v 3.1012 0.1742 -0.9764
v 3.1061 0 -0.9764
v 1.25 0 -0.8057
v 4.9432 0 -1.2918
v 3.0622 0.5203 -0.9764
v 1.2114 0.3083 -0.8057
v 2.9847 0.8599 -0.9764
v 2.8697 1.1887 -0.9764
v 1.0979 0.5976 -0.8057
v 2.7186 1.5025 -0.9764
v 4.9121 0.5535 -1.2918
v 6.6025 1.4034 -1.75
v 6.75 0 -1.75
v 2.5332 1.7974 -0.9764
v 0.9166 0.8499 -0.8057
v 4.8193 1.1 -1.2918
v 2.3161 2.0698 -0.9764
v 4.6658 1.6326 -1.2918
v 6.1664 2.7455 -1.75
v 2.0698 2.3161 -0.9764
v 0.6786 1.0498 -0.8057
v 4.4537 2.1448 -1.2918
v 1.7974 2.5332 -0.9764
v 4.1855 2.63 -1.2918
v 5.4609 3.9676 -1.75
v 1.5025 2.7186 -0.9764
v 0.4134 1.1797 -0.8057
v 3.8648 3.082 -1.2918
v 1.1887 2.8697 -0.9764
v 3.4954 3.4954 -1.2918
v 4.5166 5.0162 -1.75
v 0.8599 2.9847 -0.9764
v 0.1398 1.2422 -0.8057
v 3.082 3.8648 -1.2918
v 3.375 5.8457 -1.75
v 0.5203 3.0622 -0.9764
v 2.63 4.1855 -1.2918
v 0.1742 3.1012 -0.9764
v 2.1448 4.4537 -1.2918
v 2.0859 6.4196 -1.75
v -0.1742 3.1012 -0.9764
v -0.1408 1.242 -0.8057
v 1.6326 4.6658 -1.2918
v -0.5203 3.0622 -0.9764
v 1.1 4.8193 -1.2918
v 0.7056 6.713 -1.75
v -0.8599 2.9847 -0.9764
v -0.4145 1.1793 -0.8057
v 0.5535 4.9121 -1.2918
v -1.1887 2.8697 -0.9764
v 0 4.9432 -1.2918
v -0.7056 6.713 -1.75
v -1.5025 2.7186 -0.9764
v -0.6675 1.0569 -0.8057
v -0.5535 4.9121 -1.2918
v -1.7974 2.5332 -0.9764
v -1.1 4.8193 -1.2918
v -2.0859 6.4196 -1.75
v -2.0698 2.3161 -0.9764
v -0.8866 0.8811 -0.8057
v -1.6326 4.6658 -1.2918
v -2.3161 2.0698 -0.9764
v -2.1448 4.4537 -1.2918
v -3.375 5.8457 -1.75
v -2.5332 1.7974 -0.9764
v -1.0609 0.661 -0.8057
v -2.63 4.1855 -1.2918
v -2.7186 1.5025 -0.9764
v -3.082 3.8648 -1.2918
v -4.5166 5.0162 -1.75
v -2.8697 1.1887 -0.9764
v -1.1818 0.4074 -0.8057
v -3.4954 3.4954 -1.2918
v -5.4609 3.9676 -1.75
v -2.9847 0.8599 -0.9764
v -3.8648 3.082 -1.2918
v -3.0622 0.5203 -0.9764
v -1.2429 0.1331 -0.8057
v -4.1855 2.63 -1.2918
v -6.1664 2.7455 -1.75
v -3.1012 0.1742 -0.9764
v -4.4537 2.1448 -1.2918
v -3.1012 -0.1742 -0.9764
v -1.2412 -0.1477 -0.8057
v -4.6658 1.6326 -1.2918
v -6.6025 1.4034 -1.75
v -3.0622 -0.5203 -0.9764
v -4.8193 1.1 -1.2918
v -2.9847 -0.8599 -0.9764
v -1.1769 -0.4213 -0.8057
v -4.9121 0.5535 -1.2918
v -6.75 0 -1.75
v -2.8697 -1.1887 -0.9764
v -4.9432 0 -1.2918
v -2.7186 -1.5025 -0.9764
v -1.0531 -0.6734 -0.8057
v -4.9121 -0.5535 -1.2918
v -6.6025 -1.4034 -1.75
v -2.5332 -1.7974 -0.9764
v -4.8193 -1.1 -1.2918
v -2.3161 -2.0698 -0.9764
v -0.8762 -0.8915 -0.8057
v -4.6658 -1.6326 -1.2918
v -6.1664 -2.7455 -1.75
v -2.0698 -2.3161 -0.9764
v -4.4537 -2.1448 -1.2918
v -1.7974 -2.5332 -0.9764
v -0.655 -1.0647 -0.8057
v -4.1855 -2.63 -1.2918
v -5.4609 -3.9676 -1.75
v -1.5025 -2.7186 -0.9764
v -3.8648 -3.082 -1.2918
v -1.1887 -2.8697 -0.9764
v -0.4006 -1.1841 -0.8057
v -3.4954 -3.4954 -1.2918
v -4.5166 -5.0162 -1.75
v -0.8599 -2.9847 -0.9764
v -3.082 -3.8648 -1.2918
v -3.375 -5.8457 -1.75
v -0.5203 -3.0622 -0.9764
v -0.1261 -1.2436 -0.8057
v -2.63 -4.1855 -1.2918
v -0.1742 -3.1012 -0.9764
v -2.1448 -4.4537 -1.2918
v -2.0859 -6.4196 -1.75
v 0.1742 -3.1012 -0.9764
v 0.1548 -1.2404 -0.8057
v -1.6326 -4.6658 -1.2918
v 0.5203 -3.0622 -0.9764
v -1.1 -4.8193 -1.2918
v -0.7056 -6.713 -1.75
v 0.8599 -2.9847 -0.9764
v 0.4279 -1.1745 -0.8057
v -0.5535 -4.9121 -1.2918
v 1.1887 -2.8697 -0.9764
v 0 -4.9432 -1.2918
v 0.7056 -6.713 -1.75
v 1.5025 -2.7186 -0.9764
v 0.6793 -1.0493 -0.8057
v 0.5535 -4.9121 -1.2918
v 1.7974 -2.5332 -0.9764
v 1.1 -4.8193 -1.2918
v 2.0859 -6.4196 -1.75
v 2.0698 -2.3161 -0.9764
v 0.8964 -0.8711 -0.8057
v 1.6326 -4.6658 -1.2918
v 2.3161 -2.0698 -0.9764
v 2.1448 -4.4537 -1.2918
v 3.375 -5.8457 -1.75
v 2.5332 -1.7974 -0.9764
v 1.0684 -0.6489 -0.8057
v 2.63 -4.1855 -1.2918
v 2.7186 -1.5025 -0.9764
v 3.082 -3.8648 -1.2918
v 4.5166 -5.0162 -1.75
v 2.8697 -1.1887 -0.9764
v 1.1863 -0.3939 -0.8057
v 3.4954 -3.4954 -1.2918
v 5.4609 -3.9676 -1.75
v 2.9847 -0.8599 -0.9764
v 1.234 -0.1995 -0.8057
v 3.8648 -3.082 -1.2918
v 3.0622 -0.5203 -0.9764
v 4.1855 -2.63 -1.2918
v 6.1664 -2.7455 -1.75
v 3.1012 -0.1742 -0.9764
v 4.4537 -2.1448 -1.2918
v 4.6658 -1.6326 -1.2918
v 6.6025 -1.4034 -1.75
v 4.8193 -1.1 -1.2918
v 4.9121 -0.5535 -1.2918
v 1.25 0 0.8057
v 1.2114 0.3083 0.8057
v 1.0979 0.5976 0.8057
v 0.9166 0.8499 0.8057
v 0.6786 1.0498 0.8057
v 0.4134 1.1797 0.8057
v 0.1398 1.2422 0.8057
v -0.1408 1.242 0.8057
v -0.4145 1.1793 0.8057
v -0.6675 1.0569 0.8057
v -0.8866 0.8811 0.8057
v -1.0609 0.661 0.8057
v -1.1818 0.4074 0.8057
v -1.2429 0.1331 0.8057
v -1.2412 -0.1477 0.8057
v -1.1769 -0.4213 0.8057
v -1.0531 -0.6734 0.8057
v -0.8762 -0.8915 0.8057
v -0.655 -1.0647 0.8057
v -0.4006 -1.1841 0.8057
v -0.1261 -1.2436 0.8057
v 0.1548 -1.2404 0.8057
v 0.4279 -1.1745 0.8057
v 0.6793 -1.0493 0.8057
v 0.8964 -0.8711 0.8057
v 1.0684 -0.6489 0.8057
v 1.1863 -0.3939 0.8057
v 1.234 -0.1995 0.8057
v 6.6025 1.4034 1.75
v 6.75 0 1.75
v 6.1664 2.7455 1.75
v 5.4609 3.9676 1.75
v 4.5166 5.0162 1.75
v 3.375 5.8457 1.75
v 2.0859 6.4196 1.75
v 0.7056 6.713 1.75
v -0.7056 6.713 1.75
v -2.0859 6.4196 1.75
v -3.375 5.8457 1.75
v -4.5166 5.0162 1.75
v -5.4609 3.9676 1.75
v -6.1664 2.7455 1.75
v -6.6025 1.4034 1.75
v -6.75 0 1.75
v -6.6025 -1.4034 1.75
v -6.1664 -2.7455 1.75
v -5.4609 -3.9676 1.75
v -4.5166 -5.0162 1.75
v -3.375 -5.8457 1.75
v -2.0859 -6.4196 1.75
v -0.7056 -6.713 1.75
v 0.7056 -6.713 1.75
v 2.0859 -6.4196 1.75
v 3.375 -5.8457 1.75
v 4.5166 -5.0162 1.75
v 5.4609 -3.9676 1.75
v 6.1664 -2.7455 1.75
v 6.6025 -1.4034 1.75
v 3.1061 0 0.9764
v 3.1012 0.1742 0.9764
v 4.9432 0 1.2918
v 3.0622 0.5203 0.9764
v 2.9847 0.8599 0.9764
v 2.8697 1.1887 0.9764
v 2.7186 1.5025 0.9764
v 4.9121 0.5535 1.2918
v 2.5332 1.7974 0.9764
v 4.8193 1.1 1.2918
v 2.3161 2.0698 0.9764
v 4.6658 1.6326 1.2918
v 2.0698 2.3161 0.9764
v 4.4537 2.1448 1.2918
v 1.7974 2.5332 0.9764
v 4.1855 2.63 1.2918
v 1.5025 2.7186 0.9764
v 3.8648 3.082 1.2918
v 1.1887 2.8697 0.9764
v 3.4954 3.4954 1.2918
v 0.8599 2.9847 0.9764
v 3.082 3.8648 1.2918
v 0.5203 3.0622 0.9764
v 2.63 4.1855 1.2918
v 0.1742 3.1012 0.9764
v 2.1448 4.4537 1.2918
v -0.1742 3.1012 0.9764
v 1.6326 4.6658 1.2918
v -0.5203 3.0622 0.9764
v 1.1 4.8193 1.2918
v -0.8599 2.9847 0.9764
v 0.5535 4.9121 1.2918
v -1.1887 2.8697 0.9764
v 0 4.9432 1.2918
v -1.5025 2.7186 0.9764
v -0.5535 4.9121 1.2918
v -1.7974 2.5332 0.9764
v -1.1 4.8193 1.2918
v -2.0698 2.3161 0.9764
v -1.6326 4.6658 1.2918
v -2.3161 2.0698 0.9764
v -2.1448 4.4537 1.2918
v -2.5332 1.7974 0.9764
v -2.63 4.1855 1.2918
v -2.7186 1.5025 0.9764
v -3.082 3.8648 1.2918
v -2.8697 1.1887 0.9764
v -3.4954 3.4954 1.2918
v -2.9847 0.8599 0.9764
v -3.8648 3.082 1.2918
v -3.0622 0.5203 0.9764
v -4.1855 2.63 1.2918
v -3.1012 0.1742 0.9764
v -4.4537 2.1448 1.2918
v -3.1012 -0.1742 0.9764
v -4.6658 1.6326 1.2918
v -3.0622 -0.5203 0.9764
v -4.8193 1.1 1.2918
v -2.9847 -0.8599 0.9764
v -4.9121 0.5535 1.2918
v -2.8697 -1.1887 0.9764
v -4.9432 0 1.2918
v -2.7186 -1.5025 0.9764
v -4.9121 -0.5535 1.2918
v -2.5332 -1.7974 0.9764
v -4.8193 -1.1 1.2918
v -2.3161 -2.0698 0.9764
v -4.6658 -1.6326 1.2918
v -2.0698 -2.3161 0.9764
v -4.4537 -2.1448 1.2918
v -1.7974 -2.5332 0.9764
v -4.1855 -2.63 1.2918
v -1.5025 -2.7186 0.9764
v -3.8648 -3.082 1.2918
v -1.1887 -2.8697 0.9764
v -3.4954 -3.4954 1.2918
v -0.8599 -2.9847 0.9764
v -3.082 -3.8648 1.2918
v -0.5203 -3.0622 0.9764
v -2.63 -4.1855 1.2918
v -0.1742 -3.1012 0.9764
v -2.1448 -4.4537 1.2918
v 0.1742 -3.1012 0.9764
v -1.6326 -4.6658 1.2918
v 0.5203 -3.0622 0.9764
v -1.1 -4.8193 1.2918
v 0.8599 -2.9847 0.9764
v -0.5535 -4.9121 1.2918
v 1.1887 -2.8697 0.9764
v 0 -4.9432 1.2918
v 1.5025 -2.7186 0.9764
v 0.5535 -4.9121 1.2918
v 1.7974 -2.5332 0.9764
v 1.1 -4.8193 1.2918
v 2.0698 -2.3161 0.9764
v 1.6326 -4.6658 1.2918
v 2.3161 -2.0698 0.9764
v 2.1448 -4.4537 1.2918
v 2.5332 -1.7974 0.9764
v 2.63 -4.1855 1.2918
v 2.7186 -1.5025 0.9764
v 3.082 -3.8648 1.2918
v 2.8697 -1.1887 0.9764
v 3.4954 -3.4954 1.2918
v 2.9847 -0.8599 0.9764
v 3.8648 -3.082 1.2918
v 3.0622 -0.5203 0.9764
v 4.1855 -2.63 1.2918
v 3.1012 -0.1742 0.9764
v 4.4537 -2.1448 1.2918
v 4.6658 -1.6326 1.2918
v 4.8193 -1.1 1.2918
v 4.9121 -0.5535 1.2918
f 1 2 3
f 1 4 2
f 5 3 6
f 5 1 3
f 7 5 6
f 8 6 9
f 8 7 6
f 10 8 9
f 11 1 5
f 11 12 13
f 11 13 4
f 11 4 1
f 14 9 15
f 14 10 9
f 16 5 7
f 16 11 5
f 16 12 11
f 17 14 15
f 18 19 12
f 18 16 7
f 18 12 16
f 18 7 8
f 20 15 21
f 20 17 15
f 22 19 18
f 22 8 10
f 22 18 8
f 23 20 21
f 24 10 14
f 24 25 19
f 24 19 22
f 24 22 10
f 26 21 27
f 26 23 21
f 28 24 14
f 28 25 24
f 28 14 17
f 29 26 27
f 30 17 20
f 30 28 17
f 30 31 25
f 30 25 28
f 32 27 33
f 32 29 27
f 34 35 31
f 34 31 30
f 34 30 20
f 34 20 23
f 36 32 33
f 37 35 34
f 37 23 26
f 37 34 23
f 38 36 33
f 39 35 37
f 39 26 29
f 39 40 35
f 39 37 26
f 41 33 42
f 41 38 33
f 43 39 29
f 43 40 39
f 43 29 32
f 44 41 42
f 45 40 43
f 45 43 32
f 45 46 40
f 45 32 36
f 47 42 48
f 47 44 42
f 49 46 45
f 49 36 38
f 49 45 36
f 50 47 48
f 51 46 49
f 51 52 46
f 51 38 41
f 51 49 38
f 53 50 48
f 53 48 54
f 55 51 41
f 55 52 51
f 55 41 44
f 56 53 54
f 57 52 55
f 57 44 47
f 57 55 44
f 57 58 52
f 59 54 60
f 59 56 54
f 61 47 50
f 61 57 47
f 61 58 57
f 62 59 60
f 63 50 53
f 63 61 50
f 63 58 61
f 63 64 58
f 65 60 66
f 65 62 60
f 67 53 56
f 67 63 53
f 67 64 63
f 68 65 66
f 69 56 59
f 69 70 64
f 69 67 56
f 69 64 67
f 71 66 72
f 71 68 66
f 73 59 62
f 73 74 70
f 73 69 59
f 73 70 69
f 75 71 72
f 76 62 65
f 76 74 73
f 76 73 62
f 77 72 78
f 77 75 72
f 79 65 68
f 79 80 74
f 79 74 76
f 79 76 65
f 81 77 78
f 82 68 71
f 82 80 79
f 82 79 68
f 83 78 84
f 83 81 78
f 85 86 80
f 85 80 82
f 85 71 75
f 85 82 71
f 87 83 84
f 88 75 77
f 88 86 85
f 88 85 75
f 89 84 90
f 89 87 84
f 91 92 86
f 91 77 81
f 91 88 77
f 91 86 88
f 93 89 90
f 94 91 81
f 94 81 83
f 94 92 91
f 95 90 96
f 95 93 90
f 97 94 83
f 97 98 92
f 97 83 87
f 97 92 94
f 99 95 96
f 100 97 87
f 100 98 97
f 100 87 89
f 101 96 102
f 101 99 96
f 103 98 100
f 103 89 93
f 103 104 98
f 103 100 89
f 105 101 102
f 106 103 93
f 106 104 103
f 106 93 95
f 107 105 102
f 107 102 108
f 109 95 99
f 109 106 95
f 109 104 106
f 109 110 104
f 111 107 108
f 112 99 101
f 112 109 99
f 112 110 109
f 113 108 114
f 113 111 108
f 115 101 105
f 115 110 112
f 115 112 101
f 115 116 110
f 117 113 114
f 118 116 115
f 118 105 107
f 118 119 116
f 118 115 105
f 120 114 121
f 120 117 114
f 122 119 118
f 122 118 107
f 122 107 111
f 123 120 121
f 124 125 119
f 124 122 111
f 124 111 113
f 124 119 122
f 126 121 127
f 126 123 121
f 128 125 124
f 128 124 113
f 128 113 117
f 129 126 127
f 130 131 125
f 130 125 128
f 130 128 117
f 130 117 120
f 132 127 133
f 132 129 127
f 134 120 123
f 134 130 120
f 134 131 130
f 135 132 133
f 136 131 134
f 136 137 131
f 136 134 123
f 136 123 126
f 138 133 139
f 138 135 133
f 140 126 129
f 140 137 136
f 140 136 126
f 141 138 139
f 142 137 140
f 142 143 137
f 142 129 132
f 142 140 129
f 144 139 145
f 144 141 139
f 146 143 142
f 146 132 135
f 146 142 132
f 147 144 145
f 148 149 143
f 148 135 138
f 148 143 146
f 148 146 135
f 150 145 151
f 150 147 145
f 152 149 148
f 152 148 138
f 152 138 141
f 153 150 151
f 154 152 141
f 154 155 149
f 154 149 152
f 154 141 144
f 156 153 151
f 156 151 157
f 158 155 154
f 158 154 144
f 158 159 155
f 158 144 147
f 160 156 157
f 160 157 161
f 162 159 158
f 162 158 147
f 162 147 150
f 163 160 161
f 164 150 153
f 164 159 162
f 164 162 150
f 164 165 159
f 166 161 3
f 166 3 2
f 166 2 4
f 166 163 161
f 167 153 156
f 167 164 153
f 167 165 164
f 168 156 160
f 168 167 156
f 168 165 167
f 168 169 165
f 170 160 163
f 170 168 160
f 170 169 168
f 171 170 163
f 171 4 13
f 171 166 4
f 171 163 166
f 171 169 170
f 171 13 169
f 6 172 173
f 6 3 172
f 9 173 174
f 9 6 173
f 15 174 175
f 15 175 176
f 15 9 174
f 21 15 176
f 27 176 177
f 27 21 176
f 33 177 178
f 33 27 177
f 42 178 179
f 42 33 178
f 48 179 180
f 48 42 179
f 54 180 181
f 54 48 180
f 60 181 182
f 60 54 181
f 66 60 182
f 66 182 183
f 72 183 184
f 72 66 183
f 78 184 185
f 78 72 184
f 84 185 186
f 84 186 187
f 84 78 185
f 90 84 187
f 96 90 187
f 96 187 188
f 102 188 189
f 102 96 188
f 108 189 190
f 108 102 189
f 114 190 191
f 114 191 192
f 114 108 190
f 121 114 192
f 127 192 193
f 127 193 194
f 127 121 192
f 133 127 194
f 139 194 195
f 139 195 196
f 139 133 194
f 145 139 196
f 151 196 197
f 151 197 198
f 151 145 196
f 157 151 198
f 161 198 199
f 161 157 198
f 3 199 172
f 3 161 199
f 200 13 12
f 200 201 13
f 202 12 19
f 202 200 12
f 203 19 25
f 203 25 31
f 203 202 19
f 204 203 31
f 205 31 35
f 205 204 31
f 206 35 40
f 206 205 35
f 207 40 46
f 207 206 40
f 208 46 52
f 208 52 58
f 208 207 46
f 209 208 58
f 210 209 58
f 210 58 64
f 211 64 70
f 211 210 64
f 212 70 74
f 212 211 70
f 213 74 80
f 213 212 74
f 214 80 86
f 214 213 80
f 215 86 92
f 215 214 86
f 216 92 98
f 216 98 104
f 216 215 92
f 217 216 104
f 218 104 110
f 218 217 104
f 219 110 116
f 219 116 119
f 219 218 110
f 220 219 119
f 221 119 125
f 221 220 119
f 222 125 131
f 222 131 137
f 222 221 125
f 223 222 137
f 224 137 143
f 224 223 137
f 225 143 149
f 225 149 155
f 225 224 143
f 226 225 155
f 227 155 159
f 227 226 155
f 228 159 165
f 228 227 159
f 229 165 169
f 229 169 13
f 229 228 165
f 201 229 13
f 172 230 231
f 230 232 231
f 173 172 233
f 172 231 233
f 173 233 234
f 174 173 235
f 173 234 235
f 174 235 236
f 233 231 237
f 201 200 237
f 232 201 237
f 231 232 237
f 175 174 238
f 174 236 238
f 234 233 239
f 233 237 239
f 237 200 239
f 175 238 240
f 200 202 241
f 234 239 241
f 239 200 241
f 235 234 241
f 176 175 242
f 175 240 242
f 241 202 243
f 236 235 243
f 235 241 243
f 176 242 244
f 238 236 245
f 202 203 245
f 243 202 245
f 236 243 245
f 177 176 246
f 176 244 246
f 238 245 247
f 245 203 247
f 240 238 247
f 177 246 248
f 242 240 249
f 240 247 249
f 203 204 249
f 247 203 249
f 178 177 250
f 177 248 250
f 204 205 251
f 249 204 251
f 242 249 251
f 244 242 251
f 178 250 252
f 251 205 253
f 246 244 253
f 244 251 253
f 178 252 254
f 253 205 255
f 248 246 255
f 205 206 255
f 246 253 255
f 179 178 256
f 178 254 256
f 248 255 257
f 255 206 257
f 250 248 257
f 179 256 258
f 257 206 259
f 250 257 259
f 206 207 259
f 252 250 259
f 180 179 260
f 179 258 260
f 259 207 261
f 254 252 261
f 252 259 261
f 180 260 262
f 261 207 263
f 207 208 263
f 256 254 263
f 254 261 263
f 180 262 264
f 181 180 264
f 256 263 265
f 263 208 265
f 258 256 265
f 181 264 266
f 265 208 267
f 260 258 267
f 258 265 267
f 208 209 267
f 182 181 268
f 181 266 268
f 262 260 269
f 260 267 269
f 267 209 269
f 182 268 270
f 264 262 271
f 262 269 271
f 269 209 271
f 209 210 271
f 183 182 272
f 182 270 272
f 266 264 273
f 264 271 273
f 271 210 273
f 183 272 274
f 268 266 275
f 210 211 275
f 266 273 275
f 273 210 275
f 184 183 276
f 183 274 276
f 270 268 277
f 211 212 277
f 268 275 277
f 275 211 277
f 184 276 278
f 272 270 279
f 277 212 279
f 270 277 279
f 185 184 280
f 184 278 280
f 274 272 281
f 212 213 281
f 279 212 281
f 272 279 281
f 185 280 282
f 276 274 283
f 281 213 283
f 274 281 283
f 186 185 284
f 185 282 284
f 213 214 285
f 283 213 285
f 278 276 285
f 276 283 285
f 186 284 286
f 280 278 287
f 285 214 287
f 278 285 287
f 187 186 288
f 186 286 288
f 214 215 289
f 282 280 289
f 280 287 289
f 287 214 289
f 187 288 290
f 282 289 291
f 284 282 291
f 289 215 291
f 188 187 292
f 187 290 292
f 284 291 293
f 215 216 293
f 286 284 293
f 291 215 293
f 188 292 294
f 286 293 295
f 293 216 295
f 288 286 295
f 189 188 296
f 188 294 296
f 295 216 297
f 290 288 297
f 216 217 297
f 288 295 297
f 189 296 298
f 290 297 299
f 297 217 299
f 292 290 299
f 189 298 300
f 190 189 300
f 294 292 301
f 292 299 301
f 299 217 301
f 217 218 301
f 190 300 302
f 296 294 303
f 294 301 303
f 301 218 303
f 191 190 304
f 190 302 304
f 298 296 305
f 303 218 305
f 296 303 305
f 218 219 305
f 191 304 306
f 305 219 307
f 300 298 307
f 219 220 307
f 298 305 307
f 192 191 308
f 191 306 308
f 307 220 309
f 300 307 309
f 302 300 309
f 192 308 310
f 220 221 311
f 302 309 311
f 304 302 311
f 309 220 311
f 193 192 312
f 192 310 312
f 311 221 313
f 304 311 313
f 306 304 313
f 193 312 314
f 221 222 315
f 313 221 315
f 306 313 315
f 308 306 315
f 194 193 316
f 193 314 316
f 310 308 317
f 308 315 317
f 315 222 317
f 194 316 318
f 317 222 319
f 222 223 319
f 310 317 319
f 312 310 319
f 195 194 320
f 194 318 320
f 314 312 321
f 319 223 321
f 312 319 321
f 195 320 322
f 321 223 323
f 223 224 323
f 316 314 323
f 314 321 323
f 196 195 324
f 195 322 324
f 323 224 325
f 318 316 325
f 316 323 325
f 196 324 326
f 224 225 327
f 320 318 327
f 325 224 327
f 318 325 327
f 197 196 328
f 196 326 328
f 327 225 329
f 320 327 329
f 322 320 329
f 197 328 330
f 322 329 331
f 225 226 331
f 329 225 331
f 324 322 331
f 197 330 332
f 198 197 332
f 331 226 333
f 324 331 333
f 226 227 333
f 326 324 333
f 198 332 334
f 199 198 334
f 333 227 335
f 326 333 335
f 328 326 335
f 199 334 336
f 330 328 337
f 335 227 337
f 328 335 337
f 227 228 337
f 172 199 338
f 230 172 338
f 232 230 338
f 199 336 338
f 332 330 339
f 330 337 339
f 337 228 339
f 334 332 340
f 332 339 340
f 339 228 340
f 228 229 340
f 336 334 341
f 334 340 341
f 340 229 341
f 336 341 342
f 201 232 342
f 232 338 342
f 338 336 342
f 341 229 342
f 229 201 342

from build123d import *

# Parameters (mm, degrees)
SKETCH1_R           = 6.75
SKETCH1_R_2         = 1.25
BOSS_EXTRUDE1_DEPTH = 1.75


with BuildPart() as part:
    # Sketch1 → Boss-Extrude1 (new, symmetric)
    with BuildSketch(Plane.XY):
        Circle(SKETCH1_R)
        Circle(SKETCH1_R_2, mode=Mode.SUBTRACT)
    extrude(amount=BOSS_EXTRUDE1_DEPTH, both=True)

    # Sketch2 → Cut-Revolve1 (revolve, cut)
    with BuildSketch(Plane(origin=(0, 0, 0), x_dir=(1, 0, 0), z_dir=(0, 1, 0))):
        with BuildLine():
            Line((0, 1.75), (-6.75, 1.75))
            ThreePointArc((-6.75, 1.75), (-3.410178727, 1.018421792), (0, 0.772873706))
            Line((0, 0.772873706), (0, 1.75))
        make_face()
    cut_revolve1 = revolve(axis=Axis((0, 0, -3.982137232), (0, 0, 1)), mode=Mode.SUBTRACT)

    # Mirror1: Cut-Revolve1 across plane
    add(cut_revolve1.mirror(Plane.XY), mode=Mode.SUBTRACT)


solid = part.part
